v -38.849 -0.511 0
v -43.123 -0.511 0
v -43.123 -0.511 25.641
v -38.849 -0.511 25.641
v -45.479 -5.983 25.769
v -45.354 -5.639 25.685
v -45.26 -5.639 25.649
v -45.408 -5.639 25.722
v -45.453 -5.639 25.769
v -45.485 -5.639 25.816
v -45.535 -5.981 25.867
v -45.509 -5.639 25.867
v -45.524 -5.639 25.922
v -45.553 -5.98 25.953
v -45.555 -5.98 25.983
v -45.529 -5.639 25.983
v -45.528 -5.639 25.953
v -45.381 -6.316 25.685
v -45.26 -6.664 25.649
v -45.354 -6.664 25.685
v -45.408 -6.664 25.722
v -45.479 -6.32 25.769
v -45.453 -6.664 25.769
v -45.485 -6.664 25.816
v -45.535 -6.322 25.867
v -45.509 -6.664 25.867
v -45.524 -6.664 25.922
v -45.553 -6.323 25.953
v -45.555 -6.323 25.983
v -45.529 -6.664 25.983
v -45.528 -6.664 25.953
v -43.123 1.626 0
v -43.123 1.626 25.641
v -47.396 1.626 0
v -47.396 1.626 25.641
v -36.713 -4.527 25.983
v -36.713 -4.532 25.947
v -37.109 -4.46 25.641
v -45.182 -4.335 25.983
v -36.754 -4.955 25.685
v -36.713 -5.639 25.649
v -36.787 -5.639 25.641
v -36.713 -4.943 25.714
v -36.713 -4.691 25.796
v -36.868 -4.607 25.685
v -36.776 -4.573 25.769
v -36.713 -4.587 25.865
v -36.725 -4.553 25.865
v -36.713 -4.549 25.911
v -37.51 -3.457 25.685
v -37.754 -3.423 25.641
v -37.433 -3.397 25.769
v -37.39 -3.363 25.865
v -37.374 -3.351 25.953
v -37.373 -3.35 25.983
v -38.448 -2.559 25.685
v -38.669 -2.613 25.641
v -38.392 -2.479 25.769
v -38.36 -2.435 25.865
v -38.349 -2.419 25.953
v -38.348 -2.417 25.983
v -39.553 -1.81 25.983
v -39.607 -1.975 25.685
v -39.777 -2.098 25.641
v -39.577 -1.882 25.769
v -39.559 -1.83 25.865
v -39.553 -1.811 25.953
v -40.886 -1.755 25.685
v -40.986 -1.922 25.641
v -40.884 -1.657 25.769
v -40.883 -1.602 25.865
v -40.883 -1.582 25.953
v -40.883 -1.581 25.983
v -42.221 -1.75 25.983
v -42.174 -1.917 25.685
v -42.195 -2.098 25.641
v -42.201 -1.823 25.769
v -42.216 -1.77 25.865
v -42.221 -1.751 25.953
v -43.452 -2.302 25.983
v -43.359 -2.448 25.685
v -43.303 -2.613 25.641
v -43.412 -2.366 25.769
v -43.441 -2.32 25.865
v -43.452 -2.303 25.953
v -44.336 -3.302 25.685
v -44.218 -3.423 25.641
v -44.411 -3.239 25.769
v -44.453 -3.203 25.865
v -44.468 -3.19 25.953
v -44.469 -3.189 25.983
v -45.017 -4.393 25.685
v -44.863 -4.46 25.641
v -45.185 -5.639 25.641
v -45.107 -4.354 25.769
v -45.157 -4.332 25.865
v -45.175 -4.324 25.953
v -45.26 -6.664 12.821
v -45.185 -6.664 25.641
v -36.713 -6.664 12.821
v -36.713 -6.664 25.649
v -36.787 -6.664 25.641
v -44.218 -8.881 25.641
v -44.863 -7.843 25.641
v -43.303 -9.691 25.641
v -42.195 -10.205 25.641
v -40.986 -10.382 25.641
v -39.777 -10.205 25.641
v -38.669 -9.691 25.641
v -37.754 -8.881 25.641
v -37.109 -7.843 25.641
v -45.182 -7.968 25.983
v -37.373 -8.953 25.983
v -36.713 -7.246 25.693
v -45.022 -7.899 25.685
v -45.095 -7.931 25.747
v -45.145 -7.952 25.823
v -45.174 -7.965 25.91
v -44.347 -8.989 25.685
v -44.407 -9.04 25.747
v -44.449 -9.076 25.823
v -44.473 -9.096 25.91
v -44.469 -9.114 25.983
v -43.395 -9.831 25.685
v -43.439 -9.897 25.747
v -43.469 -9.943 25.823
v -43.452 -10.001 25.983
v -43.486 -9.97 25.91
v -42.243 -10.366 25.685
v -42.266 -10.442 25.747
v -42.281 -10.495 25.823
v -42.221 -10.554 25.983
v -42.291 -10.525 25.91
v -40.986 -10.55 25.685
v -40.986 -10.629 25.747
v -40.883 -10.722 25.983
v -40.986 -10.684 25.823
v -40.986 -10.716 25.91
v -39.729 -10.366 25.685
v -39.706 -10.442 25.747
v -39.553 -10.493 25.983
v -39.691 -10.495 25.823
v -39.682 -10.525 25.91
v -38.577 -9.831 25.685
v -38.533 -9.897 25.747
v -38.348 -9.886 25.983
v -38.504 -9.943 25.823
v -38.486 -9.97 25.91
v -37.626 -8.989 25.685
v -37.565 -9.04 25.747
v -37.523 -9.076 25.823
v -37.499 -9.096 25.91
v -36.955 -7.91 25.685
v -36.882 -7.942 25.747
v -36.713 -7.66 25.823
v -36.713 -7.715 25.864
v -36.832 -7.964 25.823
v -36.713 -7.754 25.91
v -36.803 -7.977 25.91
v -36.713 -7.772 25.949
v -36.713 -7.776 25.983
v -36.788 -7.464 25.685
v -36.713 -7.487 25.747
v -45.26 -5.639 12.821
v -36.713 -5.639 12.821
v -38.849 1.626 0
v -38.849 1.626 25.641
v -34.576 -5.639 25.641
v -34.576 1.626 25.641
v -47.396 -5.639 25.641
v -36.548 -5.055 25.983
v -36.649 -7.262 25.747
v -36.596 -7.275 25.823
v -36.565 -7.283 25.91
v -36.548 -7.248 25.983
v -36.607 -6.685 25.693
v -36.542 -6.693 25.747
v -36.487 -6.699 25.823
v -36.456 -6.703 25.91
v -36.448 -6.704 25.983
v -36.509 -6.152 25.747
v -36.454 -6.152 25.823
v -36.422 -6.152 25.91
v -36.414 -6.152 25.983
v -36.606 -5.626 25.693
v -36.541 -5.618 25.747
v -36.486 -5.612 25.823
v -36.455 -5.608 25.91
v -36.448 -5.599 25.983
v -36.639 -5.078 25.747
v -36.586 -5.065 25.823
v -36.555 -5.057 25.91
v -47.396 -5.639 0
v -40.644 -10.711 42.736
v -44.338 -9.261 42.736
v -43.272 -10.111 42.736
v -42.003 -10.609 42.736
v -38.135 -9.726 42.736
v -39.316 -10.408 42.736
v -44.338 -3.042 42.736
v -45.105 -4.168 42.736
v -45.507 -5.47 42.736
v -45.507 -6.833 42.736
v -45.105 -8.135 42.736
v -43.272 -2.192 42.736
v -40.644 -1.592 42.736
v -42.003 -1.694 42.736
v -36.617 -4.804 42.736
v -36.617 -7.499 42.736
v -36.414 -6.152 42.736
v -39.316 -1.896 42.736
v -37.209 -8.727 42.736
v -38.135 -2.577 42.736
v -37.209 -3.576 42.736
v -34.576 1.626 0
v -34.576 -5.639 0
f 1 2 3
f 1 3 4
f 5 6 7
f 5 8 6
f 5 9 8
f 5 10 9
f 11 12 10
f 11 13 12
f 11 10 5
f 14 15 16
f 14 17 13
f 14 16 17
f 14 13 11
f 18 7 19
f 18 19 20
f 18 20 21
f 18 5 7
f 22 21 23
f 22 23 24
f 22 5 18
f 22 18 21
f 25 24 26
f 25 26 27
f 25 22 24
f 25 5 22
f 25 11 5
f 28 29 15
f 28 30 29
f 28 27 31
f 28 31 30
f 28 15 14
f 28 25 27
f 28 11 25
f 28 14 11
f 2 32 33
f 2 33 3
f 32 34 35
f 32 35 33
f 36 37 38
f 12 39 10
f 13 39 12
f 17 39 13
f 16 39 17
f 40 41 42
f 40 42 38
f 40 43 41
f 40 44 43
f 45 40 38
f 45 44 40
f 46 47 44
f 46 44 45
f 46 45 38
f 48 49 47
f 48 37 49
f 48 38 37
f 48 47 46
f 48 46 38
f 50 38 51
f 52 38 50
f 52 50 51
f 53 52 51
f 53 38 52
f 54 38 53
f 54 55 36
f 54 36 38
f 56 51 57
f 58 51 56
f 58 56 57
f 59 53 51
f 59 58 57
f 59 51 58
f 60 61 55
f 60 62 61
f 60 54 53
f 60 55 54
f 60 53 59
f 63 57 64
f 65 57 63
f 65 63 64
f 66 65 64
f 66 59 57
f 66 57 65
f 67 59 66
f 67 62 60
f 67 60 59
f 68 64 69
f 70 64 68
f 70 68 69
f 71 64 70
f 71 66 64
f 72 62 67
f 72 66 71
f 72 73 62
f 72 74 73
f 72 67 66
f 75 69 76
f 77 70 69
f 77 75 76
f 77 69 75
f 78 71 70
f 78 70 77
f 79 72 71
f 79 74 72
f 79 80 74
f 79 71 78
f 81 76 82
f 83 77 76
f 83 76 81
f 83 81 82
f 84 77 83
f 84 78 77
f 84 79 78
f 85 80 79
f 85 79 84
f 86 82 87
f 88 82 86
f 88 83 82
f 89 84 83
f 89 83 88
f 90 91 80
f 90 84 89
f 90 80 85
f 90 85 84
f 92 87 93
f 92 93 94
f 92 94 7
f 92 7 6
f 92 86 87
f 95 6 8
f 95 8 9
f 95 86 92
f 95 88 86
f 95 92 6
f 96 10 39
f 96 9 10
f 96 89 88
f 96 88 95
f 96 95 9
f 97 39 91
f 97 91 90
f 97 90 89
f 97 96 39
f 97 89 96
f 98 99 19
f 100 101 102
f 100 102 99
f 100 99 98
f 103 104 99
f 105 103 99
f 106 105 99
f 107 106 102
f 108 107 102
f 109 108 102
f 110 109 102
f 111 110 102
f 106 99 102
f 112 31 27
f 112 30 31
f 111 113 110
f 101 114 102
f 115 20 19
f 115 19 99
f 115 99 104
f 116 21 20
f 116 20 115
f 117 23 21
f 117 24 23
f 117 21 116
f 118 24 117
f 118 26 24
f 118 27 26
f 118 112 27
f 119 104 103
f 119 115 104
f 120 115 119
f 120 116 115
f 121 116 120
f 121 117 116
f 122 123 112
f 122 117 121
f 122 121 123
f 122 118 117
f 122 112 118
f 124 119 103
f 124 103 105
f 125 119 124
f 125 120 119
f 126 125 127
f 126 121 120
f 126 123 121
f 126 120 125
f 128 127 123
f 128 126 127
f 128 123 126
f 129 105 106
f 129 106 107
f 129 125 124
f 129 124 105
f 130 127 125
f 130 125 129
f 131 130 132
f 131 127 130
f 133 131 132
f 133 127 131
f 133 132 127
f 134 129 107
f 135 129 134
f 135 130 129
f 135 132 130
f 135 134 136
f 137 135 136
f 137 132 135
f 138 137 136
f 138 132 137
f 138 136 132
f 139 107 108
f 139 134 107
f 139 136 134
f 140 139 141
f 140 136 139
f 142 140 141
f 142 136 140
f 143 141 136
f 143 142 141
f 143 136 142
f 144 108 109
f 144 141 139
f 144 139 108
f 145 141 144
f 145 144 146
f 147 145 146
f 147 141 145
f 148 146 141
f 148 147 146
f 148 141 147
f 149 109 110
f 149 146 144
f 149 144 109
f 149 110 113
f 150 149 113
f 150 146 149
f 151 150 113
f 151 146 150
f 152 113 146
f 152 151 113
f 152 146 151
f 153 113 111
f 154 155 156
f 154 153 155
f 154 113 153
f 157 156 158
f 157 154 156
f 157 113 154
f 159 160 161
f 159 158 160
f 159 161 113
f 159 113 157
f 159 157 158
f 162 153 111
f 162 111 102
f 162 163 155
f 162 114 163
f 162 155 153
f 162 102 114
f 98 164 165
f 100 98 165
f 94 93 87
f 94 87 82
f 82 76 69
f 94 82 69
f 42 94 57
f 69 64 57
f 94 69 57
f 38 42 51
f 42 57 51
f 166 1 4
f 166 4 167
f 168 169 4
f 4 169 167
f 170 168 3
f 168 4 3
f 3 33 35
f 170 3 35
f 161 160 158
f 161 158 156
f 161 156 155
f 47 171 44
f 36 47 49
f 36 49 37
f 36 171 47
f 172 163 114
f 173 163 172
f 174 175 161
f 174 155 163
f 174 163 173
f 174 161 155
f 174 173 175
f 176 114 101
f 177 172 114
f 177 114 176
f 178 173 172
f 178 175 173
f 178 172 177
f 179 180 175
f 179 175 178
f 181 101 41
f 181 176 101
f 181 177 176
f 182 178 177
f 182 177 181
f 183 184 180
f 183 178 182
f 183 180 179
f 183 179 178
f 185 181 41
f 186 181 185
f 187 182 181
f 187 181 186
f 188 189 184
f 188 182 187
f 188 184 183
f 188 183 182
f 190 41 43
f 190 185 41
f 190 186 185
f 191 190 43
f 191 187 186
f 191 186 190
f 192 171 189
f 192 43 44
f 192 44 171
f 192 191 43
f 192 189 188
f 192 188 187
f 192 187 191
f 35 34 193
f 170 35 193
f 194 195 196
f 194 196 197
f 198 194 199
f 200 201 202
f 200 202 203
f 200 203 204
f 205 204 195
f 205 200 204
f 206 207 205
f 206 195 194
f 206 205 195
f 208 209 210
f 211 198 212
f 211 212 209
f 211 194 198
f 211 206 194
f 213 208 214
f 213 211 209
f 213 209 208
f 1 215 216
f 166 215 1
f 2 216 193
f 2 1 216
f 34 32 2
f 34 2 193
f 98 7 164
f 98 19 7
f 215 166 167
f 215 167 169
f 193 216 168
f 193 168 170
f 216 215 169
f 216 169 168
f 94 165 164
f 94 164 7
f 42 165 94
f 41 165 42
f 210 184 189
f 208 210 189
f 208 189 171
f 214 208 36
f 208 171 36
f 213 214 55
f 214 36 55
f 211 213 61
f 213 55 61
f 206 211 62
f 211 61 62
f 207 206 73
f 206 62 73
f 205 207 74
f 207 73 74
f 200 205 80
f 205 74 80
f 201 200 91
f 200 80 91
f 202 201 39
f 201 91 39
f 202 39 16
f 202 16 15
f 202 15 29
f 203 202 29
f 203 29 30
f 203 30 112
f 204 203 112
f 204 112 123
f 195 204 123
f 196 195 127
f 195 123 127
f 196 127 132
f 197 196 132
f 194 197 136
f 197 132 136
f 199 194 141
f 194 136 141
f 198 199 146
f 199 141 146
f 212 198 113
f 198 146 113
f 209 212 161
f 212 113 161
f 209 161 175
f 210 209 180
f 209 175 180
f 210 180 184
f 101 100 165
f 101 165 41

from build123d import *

# Parameters (mm, degrees)
BOSS_EXTRUDE1_DEPTH = 25.6413
SKETCH2_W           = 8.5471
SKETCH2_H           = 1.025652
BOSS_EXTRUDE2_DEPTH = 12.82065
SKETCH3_R           = 4.572
BOSS_EXTRUDE3_DEPTH = 17.0942
FILLET11_R          = 0.341884


with BuildPart() as part:
    # Sketch1 → Boss-Extrude1 (new body)
    with BuildSketch(Plane.XY):
        Polygon((-38.8493, -0.51054), (-38.8493, 1.626235), (-34.57575, 1.626235), (-34.57575, -5.6388), (-47.3964, -5.6388), (-47.3964, -0.51054), (-47.3964, 1.626235), (-43.12285, 1.626235), (-43.12285, -0.51054), align=None)
    extrude(amount=BOSS_EXTRUDE1_DEPTH)


with BuildPart() as body_2:
    # Sketch2 → Boss-Extrude2 (new body)
    with BuildSketch(Plane.XY.offset(25.6413)):
        with Locations((-40.986075, -6.151626)):
            Rectangle(SKETCH2_W, SKETCH2_H)
    extrude(amount=-BOSS_EXTRUDE2_DEPTH)

    # Sketch3 → Boss-Extrude3 (add)
    with BuildSketch(Plane.XY.offset(25.6413)):
        with Locations((-40.986075, -6.151626)):
            Circle(SKETCH3_R)
    extrude(amount=BOSS_EXTRUDE3_DEPTH)

    # Fillet11
    # the kernel refuses this fillet: 0.341884 mm, written as the material it takes off along each edge
    with BuildSketch(Plane(origin=(-40.986075, -6.151626, 25.6413), x_dir=(1, 0, 0), z_dir=(0, -1, 0))) as fillet11_piece_1_section:
        with BuildLine():
            CenterArc((4.572 - FILLET11_R, FILLET11_R), FILLET11_R, 270, 90)
            Line((4.572 - FILLET11_R, 0), (4.572, 0))
            Line((4.572, 0), (4.572, FILLET11_R))
        make_face()
    fillet11_piece_1 = revolve(axis=Axis((-40.986075, -6.151626, 25.6413), (0, 0, 1)), mode=Mode.PRIVATE)
    fillet11_piece_1 = split(fillet11_piece_1, bisect_by=Plane(origin=(-36.712525, -6.151626373, 25.717911182), z_dir=(1, 0, 0)), keep=Keep.TOP, mode=Mode.PRIVATE)
    add(fillet11_piece_1, mode=Mode.SUBTRACT)
    with BuildSketch(Plane(origin=(-40.986075, -6.151626, 25.6413), x_dir=(1, 0, 0), z_dir=(0, -1, 0))) as fillet11_piece_2_section:
        with BuildLine():
            CenterArc((4.572 - FILLET11_R, FILLET11_R), FILLET11_R, 270, 90)
            Line((4.572 - FILLET11_R, 0), (4.572, 0))
            Line((4.572, 0), (4.572, FILLET11_R))
        make_face()
    fillet11_piece_2 = revolve(axis=Axis((-40.986075, -6.151626, 25.6413), (0, 0, 1)), mode=Mode.PRIVATE)
    fillet11_piece_2 = split(fillet11_piece_2, bisect_by=Plane(origin=(-40.986075, -5.6388, 25.736787981), z_dir=(0, 1, 0)), keep=Keep.TOP, mode=Mode.PRIVATE)
    add(fillet11_piece_2, mode=Mode.SUBTRACT)
    with BuildSketch(Plane(origin=(-40.986075, -6.151626, 25.6413), x_dir=(1, 0, 0), z_dir=(0, -1, 0))) as fillet11_piece_3_section:
        with BuildLine():
            CenterArc((4.572 - FILLET11_R, FILLET11_R), FILLET11_R, 270, 90)
            Line((4.572 - FILLET11_R, 0), (4.572, 0))
            Line((4.572, 0), (4.572, FILLET11_R))
        make_face()
    fillet11_piece_3 = revolve(axis=Axis((-40.986075, -6.151626, 25.6413), (0, 0, 1)), mode=Mode.PRIVATE)
    fillet11_piece_3 = split(fillet11_piece_3, bisect_by=Plane(origin=(-36.749842277, -6.664452, 25.642654228), z_dir=(0, -1, 0)), keep=Keep.TOP, mode=Mode.PRIVATE)
    add(fillet11_piece_3, mode=Mode.SUBTRACT)
    with BuildSketch(Plane(origin=(-40.986075, -6.151626, 25.6413), x_dir=(1, 0, 0), z_dir=(0, -1, 0))) as fillet11_piece_4_section:
        with BuildLine():
            CenterArc((4.572 - FILLET11_R, FILLET11_R), FILLET11_R, 270, 90)
            Line((4.572 - FILLET11_R, 0), (4.572, 0))
            Line((4.572, 0), (4.572, FILLET11_R))
        make_face()
    fillet11_piece_4 = revolve(axis=Axis((-40.986075, -6.151626, 25.6413), (0, 0, 1)), mode=Mode.PRIVATE)
    fillet11_piece_4 = split(fillet11_piece_4, bisect_by=Plane(origin=(-45.259625, -6.151625497, 25.717911335), z_dir=(-1, 0, 0)), keep=Keep.TOP, mode=Mode.PRIVATE)
    add(fillet11_piece_4, mode=Mode.SUBTRACT)


solid = Compound([part.part, body_2.part])
